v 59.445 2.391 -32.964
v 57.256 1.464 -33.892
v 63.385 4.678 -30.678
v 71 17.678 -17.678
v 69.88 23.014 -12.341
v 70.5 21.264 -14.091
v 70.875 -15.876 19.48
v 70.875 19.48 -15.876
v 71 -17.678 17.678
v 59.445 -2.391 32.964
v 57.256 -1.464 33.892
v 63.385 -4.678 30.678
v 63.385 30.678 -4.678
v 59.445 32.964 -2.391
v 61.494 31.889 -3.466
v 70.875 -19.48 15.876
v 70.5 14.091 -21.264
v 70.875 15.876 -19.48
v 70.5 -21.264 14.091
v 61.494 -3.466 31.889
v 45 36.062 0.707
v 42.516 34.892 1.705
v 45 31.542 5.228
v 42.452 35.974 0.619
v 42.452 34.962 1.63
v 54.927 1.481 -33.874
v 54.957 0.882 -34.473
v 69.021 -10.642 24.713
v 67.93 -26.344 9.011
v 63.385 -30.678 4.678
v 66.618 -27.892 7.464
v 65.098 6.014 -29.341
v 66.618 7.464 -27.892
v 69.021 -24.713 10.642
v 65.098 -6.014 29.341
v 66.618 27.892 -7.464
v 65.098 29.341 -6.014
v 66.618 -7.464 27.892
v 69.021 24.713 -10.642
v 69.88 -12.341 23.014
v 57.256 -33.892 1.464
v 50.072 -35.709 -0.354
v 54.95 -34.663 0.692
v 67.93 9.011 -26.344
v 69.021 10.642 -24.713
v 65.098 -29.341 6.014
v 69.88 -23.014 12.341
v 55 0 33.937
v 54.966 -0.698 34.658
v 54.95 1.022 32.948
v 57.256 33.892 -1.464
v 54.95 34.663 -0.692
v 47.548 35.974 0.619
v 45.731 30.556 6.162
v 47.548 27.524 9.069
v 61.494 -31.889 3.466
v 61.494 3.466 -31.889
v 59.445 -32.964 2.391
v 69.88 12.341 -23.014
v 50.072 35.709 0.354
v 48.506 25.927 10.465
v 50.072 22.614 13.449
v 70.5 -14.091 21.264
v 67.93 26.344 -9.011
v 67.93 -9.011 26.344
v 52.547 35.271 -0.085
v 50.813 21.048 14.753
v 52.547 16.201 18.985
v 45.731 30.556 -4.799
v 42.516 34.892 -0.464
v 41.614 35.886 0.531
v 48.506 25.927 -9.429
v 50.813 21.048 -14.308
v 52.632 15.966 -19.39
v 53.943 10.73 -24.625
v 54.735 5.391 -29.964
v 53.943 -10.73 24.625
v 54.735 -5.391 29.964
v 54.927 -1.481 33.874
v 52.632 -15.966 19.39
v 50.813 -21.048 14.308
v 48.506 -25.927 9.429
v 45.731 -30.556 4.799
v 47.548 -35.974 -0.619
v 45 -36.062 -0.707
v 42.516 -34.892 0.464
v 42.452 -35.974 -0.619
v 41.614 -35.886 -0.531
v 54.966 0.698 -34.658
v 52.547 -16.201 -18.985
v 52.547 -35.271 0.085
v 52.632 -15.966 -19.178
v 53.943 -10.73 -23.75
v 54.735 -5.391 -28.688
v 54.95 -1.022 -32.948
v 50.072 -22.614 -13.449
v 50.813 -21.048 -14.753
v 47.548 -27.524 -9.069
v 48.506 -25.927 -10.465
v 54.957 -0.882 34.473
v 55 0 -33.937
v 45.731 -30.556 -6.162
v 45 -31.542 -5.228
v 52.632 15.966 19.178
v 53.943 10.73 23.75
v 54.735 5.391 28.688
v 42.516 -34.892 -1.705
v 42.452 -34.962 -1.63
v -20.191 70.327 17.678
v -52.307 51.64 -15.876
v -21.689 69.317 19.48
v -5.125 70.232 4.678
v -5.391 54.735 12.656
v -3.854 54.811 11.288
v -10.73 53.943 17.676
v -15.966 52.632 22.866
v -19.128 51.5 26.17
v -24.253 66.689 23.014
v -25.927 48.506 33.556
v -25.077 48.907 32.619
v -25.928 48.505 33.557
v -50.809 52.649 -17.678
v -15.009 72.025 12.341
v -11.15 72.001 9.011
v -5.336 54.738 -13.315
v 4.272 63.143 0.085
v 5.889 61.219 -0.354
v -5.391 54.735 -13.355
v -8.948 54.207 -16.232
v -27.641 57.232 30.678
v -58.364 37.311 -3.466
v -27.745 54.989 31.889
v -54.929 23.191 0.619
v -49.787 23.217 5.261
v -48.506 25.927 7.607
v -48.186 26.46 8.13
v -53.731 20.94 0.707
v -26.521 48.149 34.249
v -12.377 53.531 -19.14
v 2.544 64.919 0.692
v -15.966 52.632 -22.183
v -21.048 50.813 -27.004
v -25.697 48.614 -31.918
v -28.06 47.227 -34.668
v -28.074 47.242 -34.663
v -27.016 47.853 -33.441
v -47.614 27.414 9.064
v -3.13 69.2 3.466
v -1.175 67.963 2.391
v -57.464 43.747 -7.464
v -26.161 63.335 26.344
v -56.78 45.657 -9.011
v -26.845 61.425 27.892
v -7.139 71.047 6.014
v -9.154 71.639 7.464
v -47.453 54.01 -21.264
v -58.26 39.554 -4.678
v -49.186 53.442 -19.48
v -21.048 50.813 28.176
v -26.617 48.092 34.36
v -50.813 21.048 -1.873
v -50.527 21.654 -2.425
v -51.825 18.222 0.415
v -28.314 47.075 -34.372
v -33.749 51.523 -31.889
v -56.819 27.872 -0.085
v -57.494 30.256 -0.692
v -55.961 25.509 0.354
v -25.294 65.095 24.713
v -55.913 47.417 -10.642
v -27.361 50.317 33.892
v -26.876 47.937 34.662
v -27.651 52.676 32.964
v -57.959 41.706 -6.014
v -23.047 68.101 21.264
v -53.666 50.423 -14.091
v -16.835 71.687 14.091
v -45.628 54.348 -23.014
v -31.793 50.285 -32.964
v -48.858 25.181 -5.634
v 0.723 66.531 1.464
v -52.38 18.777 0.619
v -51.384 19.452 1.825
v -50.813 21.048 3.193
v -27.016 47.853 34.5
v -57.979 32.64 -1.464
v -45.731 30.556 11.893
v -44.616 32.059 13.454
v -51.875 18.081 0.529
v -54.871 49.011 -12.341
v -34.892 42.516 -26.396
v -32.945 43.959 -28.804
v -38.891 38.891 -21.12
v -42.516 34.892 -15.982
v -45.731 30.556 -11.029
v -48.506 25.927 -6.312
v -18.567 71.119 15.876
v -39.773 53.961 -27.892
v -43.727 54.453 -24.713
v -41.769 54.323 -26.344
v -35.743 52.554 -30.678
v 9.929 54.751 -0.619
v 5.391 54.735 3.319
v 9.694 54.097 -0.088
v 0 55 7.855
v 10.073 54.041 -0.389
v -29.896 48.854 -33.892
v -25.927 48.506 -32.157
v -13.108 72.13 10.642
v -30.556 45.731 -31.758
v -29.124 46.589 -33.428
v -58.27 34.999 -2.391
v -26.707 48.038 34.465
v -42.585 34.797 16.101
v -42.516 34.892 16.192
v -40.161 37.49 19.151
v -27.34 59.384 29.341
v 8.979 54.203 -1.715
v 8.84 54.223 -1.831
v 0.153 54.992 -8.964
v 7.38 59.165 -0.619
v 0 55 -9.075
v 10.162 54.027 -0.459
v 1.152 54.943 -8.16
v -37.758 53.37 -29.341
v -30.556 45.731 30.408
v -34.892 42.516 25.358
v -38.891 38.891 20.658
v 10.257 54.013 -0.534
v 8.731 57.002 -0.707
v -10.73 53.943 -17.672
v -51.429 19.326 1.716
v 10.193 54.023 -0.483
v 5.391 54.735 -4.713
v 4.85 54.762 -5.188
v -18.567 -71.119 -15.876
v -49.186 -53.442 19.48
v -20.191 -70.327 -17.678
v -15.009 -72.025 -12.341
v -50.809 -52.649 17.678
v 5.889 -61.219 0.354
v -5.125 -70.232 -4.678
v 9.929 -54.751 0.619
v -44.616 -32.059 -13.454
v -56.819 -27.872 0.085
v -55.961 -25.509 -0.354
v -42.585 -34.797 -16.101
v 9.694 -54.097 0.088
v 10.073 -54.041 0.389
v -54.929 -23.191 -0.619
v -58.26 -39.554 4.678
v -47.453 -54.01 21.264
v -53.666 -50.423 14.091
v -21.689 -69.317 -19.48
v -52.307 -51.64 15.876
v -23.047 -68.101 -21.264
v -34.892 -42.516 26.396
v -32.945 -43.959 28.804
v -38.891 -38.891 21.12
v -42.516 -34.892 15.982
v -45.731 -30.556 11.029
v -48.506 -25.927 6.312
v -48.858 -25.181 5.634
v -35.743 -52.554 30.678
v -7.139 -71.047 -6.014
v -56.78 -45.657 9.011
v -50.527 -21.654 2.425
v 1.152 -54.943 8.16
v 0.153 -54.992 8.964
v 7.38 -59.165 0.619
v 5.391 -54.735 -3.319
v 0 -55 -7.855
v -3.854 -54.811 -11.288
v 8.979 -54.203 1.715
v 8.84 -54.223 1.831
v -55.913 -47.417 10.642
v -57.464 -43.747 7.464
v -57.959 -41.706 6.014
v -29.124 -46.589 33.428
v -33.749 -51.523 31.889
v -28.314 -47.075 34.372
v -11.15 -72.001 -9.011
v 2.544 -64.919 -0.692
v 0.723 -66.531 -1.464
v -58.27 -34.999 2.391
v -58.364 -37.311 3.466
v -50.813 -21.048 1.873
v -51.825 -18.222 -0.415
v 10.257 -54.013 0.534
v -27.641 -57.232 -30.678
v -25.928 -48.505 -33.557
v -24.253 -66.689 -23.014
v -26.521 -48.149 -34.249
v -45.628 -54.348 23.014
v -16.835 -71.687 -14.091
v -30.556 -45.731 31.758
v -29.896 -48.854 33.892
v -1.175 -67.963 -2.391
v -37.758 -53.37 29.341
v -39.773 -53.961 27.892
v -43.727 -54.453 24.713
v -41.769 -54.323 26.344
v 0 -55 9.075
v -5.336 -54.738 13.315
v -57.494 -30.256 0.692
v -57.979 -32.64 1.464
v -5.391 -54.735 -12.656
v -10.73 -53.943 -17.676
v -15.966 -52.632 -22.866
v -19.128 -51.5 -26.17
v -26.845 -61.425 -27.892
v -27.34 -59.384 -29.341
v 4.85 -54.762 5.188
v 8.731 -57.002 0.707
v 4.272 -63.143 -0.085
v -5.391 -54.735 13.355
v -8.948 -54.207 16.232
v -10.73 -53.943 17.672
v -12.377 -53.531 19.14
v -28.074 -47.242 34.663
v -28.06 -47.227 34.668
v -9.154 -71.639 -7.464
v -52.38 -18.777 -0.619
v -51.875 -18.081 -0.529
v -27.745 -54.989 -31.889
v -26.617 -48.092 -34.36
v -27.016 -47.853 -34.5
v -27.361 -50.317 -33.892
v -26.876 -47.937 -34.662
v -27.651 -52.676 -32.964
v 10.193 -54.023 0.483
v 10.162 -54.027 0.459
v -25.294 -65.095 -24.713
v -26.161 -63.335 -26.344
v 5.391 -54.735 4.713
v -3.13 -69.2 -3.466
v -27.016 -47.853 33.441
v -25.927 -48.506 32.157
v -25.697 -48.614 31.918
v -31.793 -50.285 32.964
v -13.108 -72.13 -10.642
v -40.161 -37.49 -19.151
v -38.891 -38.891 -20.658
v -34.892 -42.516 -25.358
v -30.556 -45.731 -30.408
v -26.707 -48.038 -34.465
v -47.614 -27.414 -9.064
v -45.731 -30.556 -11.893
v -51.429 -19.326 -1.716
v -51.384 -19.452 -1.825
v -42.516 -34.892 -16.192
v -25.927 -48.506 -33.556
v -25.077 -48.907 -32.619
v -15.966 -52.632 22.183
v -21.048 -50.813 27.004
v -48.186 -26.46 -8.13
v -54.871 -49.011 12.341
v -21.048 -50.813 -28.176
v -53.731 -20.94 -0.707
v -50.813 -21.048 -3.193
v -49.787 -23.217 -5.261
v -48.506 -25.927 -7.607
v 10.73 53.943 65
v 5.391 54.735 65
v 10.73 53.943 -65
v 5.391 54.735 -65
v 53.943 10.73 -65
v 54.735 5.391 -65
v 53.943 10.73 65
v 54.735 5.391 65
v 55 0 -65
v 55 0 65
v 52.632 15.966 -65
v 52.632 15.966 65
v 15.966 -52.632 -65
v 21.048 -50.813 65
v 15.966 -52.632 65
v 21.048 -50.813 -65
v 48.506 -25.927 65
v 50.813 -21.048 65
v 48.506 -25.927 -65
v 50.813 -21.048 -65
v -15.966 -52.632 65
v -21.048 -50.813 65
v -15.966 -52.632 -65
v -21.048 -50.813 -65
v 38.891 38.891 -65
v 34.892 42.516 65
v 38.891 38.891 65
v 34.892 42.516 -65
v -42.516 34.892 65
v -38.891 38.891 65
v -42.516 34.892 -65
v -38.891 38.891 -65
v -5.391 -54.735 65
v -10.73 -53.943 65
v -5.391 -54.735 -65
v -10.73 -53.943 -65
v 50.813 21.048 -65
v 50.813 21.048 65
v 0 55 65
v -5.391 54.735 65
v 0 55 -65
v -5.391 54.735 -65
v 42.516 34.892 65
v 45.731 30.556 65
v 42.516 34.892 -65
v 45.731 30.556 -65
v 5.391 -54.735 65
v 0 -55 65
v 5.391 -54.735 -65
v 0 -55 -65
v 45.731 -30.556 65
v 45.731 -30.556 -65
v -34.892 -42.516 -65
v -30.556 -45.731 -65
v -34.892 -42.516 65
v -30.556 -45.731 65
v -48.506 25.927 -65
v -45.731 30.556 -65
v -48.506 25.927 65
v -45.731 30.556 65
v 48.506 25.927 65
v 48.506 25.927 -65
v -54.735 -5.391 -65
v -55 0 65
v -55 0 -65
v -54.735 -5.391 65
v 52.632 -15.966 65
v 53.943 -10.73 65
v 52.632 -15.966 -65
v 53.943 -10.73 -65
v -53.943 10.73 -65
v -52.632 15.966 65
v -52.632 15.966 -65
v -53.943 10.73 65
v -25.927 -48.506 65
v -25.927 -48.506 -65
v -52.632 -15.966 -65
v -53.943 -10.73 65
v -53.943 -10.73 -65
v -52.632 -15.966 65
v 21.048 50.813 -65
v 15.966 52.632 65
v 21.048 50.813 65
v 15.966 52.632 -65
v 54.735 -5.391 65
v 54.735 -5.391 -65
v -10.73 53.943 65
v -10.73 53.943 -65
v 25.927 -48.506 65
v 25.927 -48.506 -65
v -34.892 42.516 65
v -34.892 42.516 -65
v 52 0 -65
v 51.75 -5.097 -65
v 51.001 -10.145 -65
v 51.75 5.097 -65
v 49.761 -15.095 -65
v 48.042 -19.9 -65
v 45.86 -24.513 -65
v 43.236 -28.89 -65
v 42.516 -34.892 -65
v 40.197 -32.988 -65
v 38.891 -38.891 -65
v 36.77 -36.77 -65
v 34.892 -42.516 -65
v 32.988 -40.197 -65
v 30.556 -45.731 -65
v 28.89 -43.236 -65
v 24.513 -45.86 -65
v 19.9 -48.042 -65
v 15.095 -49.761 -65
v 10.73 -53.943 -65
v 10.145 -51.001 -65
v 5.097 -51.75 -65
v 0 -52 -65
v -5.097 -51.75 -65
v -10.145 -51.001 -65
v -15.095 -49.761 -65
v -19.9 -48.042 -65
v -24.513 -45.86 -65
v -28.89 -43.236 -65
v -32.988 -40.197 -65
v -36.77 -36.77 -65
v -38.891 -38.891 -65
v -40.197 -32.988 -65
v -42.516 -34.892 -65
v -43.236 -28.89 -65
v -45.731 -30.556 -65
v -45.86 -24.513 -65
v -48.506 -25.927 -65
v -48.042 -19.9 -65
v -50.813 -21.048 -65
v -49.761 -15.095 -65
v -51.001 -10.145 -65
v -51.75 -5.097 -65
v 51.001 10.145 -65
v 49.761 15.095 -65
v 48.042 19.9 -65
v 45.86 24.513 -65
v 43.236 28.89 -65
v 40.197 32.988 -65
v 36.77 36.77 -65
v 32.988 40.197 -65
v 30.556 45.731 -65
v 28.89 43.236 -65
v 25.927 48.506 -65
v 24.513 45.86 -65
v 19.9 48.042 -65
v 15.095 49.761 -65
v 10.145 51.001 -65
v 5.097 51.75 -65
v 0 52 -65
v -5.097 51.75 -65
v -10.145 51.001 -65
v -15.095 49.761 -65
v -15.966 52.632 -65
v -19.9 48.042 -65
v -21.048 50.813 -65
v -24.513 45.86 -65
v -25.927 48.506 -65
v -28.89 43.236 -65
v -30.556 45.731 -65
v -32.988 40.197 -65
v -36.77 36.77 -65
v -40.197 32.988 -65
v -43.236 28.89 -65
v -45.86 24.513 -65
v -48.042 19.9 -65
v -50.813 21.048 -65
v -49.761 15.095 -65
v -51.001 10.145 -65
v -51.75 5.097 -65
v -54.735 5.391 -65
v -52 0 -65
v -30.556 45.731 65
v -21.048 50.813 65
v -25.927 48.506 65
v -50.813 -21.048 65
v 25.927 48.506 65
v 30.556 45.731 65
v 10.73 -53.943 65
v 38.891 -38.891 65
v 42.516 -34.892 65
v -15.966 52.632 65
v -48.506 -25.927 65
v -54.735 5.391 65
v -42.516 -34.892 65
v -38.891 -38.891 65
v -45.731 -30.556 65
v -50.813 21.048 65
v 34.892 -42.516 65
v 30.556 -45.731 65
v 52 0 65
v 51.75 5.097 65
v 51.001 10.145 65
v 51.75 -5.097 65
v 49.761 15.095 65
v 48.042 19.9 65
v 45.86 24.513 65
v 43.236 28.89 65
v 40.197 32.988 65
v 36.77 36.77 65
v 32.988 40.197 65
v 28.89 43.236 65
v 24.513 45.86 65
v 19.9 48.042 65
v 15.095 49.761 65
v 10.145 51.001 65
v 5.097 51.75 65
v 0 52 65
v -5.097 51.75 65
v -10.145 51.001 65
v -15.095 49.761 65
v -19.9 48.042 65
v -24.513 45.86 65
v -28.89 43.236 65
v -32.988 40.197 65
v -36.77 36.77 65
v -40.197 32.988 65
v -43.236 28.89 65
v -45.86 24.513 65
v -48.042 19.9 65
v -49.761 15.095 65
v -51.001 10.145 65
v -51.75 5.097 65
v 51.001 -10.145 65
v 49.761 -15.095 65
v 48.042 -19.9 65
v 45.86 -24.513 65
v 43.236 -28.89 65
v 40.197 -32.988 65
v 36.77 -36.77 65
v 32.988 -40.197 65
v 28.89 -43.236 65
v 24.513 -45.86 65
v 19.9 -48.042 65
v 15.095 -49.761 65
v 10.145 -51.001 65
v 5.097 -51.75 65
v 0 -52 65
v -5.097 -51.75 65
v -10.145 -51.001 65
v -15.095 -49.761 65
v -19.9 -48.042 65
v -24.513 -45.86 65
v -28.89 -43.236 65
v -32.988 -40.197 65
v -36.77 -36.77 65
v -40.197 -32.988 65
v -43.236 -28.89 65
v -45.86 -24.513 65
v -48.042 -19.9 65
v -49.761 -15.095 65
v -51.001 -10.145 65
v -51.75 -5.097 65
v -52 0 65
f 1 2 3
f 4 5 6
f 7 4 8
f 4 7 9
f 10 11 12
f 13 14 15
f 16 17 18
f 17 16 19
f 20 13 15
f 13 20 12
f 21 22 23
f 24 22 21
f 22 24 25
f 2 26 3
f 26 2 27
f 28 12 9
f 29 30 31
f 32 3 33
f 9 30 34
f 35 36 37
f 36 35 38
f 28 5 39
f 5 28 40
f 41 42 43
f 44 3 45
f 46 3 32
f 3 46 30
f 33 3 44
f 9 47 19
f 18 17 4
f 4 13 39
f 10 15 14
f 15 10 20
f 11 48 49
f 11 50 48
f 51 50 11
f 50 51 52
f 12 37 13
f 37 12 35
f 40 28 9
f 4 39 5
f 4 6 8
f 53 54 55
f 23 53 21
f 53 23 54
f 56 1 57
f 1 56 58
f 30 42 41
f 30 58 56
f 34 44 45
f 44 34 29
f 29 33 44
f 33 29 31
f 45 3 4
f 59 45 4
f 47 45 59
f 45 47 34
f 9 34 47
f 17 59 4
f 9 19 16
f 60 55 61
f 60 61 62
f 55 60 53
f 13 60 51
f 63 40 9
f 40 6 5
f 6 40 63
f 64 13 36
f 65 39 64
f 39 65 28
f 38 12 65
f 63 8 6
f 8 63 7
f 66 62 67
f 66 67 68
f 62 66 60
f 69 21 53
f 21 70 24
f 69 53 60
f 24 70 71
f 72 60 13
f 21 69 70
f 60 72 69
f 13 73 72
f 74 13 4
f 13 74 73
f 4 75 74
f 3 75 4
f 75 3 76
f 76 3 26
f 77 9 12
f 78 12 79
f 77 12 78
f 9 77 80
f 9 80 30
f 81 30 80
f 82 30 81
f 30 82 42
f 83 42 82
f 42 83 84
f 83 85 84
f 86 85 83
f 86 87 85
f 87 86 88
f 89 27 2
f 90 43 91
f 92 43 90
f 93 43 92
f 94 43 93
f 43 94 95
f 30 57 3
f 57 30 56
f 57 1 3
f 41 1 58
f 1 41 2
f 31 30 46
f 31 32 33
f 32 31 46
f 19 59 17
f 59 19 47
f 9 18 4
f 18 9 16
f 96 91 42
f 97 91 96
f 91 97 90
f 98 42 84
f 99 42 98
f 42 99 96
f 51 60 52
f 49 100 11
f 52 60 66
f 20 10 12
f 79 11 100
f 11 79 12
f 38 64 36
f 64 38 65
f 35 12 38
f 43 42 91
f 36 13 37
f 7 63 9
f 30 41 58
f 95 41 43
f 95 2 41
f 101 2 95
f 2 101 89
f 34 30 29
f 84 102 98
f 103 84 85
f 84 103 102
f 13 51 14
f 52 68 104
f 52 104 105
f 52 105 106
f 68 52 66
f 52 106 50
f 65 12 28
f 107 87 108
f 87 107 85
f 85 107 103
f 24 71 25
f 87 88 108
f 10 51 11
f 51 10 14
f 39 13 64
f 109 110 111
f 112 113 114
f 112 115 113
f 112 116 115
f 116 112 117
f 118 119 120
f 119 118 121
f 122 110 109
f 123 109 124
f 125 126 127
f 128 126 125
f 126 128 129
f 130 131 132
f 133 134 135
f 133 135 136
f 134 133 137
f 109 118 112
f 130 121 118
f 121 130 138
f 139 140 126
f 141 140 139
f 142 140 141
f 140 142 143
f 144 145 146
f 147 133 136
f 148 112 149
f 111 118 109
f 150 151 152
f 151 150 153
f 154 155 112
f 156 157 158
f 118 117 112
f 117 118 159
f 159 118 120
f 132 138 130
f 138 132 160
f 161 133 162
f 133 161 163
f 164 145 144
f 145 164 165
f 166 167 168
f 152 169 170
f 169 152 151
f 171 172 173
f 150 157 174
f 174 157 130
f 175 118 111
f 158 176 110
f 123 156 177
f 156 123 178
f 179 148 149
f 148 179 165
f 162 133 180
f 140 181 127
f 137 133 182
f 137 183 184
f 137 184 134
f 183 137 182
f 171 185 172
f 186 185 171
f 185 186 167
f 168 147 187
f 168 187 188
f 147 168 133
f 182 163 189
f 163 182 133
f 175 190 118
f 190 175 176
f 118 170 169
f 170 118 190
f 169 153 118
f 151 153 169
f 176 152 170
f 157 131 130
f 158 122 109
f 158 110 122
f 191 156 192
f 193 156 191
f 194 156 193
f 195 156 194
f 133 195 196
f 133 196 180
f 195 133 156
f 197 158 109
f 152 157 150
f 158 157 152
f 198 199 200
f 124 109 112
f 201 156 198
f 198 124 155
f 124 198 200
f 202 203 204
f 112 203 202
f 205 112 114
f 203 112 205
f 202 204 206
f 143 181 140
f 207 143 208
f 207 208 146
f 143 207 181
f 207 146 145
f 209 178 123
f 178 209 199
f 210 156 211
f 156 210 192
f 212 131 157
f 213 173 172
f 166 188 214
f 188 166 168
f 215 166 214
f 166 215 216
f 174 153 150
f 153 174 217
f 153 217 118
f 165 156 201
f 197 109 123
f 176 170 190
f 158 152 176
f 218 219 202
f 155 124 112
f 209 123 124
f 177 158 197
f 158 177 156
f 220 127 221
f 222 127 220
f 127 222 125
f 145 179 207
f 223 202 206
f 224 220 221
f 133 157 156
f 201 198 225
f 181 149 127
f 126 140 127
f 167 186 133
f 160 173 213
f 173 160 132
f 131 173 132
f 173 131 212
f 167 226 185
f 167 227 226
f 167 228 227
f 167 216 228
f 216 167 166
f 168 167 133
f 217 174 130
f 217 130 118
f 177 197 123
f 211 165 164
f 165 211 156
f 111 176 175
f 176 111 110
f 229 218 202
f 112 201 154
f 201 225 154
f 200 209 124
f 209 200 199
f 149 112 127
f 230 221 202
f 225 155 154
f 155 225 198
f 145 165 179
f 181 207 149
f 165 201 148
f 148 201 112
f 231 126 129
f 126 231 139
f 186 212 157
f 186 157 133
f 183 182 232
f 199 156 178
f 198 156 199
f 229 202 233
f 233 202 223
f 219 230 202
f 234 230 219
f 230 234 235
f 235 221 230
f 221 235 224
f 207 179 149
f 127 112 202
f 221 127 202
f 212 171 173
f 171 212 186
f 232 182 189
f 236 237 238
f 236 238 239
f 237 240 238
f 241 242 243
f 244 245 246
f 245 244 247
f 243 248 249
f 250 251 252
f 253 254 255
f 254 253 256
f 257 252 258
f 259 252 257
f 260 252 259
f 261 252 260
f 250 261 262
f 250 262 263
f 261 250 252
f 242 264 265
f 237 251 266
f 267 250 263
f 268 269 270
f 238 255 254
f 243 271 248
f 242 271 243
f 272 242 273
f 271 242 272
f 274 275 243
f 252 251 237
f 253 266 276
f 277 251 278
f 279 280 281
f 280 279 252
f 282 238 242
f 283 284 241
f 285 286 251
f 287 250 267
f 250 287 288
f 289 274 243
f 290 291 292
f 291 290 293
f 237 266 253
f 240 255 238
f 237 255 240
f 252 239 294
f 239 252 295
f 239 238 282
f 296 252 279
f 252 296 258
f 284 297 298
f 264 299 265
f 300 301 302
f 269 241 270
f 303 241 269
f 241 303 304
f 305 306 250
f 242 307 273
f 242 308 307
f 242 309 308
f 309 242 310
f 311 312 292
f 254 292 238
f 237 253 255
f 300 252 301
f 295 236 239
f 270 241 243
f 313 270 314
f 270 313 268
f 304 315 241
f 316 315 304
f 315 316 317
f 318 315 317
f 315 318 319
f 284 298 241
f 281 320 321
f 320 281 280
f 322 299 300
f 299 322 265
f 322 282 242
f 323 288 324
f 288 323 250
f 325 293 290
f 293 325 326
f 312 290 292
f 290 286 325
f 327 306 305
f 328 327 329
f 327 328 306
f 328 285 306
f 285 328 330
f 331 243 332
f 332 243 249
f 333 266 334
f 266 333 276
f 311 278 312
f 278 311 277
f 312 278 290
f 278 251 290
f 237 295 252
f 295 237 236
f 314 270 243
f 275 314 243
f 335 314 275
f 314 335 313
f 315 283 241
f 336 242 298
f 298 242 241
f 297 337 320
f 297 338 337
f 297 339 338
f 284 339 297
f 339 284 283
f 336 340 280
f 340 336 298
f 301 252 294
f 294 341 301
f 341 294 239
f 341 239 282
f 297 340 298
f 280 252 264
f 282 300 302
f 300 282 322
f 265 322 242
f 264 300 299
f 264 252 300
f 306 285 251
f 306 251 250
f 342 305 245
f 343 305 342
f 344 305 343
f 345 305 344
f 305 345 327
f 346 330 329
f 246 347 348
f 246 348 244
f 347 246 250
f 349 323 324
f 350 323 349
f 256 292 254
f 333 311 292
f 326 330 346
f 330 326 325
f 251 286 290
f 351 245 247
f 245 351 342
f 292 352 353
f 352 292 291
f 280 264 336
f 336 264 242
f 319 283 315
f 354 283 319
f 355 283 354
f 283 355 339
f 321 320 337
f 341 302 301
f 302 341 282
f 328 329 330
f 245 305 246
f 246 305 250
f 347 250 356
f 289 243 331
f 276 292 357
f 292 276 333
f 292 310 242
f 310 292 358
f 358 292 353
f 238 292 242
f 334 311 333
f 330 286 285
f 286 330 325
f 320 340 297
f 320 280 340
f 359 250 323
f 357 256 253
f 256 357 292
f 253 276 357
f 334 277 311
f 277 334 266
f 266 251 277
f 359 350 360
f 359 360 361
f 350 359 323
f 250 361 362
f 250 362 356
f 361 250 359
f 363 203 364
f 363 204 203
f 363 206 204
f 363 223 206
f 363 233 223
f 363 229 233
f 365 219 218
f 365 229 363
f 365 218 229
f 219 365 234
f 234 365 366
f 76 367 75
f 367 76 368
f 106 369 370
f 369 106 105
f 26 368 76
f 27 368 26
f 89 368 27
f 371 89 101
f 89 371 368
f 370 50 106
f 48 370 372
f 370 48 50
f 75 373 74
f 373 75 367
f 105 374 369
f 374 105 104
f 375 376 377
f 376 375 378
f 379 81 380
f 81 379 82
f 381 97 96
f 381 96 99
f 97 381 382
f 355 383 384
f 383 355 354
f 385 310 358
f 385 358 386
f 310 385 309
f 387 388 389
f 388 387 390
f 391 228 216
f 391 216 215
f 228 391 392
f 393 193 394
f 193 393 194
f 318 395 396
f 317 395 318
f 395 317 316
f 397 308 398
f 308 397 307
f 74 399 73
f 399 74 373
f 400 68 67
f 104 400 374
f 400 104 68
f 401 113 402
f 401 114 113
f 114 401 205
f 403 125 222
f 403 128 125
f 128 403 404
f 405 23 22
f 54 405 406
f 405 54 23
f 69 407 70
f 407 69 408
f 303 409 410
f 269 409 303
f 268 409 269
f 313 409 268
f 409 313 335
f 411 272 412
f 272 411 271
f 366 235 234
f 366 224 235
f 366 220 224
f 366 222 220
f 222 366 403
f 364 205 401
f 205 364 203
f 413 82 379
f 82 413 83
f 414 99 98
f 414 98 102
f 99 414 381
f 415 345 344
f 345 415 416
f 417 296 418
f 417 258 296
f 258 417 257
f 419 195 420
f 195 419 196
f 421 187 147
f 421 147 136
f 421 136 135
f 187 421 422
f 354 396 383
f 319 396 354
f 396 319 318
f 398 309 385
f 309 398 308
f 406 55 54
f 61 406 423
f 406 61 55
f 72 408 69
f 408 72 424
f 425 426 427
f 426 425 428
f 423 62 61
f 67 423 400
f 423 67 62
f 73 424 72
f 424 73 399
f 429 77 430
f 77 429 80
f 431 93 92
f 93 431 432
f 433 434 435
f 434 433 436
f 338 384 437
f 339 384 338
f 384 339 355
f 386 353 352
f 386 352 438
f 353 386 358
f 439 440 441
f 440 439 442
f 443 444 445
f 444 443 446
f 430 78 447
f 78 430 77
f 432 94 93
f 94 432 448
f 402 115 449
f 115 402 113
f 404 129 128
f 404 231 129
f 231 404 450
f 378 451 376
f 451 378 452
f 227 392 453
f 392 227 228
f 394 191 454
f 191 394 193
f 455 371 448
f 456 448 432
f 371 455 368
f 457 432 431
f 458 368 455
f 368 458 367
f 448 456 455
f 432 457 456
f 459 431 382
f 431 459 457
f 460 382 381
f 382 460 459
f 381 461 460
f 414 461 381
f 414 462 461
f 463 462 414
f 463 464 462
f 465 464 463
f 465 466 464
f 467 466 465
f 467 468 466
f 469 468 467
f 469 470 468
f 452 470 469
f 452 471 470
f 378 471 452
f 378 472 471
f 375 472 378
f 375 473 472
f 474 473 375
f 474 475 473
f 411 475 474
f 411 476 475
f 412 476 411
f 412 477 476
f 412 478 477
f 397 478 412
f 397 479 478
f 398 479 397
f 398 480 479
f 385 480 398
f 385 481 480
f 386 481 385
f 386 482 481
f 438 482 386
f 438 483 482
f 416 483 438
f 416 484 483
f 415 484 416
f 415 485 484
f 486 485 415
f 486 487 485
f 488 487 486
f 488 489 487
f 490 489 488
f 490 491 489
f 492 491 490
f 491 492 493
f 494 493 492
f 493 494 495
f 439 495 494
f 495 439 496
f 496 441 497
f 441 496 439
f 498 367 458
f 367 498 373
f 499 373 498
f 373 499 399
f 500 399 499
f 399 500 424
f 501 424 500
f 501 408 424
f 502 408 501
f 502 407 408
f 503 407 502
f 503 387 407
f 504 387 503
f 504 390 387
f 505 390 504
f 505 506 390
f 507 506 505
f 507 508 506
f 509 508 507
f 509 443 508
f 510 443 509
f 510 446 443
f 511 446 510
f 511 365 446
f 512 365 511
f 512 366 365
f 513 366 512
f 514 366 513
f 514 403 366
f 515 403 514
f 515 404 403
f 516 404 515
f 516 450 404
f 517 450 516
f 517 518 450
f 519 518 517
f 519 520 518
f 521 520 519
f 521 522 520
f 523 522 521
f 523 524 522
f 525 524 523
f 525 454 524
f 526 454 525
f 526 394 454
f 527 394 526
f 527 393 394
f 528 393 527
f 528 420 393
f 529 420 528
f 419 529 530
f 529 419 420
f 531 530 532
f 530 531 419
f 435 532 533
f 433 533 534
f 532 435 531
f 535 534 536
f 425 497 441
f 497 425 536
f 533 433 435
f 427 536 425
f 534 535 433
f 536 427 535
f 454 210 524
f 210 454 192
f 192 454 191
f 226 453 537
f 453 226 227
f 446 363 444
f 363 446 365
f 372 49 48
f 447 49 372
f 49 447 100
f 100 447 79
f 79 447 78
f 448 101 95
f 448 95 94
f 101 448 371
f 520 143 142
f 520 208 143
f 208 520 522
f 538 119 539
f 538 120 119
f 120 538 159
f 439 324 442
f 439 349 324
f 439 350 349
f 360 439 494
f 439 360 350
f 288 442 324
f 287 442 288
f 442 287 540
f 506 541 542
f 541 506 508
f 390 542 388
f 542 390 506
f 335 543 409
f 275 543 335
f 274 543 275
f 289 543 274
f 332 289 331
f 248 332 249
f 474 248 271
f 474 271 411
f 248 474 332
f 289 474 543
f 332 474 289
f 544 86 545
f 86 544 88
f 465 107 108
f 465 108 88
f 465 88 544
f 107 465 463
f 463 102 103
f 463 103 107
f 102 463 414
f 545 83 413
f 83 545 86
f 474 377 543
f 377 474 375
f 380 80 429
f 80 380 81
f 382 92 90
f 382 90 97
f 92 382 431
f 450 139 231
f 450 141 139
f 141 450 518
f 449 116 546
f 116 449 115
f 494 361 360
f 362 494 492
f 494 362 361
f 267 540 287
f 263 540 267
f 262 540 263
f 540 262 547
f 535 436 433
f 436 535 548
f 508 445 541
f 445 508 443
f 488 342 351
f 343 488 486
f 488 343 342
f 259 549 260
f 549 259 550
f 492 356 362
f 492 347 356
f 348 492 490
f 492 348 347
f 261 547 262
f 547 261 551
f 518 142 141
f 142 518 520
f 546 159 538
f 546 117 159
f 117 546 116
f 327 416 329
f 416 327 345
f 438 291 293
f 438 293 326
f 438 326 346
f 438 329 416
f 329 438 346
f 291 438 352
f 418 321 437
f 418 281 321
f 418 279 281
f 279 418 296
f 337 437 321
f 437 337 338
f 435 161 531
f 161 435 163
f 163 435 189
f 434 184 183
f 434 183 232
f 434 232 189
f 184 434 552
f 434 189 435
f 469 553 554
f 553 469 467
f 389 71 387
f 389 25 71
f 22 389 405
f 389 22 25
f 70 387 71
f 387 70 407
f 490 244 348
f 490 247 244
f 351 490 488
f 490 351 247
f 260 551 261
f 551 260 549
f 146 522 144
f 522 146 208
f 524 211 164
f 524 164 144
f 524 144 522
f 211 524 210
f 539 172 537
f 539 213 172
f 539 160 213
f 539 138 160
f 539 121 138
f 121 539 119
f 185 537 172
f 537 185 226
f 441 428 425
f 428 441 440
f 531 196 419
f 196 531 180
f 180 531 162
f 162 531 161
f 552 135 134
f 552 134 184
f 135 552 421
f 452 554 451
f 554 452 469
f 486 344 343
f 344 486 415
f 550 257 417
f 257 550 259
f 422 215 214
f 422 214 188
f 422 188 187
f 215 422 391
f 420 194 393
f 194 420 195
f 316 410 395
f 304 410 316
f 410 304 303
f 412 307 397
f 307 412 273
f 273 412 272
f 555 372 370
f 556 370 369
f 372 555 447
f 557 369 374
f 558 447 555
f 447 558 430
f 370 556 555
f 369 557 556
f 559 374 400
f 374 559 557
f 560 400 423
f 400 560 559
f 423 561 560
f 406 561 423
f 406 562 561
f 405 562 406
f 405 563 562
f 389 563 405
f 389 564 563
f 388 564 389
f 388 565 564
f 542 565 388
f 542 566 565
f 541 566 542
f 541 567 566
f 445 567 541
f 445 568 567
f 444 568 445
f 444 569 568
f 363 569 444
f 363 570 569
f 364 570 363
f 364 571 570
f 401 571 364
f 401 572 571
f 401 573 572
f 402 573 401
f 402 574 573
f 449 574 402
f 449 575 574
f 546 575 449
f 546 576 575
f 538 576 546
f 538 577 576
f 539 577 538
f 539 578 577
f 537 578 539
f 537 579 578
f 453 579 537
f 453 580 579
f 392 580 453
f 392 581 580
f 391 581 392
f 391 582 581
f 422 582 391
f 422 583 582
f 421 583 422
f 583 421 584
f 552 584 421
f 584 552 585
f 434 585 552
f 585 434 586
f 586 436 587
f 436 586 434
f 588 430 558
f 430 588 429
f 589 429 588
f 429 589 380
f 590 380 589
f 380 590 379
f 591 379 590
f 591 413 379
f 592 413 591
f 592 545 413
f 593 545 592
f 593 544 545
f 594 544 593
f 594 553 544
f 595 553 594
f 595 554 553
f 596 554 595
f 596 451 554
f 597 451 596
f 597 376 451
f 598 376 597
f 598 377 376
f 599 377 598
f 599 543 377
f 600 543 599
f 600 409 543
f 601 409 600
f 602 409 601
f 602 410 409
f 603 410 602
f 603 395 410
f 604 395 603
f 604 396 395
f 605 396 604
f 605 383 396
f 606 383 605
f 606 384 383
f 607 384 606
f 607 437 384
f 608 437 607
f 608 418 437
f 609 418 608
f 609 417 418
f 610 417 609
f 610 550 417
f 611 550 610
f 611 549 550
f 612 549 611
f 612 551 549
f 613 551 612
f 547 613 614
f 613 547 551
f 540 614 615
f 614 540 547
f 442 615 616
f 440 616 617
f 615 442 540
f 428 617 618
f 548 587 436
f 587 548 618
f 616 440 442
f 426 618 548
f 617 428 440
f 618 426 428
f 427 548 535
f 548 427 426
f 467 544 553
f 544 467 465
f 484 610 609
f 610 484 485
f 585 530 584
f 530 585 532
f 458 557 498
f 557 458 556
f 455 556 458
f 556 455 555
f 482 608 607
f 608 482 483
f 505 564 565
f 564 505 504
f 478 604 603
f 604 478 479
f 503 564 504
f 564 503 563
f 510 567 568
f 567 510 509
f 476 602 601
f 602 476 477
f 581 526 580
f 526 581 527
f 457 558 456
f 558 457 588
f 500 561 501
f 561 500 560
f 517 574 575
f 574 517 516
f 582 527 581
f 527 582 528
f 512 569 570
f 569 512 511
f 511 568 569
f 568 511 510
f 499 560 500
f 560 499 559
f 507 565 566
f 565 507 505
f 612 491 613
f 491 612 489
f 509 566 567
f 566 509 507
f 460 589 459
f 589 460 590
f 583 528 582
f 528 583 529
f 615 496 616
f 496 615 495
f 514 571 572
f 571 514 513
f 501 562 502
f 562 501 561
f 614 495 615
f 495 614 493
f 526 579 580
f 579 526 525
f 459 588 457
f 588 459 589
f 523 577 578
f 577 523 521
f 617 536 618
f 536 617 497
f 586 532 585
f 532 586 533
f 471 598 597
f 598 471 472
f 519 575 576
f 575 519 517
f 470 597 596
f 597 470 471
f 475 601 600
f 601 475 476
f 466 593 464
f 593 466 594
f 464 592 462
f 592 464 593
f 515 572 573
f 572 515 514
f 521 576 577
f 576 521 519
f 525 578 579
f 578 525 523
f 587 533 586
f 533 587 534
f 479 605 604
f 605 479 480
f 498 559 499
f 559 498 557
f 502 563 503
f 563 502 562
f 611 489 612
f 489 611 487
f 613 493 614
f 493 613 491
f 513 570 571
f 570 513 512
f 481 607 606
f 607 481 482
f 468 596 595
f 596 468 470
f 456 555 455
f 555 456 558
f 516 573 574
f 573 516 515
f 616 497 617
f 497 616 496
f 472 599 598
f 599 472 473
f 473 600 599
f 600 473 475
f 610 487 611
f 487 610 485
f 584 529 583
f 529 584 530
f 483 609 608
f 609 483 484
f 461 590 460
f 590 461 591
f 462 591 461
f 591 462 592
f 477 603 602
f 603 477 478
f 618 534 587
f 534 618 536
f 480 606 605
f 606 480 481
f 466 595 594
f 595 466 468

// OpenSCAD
// Módulo Apilable de Torre Hidropónica Vertical — Diseñado por @craft_fox
// Compatible con cestas net-pot de 2" (50mm) y riego centralizado por gravedad
$fn = 64;

altura_modulo = 130;  // mm
radio_exterior = 55;  // mm (diámetro 110mm estándar PVC/3D)
grosor_pared = 3.0;   // mm
num_macetas = 3;      // Distribución a 120°

module socket_maceta() {
    rotate([45, 0, 0])
        cylinder(r = 26, h = 50, center = true);
}

module modulo_hidroponico() {
    difference() {
        // Cuerpo exterior con labio de acople macho-hembra
        union() {
            cylinder(r = radio_exterior, h = altura_modulo, center = true);
            for (i = [0 : num_macetas - 1]) {
                rotate([0, 0, i * 120])
                    translate([radio_exterior - 10, 0, 0])
                        socket_maceta();
            }
        }
        // Canal de agua central y retorno de solución nutriente
        cylinder(r = radio_exterior - grosor_pared, h = altura_modulo + 2, center = true);
    }
}

modulo_hidroponico();
